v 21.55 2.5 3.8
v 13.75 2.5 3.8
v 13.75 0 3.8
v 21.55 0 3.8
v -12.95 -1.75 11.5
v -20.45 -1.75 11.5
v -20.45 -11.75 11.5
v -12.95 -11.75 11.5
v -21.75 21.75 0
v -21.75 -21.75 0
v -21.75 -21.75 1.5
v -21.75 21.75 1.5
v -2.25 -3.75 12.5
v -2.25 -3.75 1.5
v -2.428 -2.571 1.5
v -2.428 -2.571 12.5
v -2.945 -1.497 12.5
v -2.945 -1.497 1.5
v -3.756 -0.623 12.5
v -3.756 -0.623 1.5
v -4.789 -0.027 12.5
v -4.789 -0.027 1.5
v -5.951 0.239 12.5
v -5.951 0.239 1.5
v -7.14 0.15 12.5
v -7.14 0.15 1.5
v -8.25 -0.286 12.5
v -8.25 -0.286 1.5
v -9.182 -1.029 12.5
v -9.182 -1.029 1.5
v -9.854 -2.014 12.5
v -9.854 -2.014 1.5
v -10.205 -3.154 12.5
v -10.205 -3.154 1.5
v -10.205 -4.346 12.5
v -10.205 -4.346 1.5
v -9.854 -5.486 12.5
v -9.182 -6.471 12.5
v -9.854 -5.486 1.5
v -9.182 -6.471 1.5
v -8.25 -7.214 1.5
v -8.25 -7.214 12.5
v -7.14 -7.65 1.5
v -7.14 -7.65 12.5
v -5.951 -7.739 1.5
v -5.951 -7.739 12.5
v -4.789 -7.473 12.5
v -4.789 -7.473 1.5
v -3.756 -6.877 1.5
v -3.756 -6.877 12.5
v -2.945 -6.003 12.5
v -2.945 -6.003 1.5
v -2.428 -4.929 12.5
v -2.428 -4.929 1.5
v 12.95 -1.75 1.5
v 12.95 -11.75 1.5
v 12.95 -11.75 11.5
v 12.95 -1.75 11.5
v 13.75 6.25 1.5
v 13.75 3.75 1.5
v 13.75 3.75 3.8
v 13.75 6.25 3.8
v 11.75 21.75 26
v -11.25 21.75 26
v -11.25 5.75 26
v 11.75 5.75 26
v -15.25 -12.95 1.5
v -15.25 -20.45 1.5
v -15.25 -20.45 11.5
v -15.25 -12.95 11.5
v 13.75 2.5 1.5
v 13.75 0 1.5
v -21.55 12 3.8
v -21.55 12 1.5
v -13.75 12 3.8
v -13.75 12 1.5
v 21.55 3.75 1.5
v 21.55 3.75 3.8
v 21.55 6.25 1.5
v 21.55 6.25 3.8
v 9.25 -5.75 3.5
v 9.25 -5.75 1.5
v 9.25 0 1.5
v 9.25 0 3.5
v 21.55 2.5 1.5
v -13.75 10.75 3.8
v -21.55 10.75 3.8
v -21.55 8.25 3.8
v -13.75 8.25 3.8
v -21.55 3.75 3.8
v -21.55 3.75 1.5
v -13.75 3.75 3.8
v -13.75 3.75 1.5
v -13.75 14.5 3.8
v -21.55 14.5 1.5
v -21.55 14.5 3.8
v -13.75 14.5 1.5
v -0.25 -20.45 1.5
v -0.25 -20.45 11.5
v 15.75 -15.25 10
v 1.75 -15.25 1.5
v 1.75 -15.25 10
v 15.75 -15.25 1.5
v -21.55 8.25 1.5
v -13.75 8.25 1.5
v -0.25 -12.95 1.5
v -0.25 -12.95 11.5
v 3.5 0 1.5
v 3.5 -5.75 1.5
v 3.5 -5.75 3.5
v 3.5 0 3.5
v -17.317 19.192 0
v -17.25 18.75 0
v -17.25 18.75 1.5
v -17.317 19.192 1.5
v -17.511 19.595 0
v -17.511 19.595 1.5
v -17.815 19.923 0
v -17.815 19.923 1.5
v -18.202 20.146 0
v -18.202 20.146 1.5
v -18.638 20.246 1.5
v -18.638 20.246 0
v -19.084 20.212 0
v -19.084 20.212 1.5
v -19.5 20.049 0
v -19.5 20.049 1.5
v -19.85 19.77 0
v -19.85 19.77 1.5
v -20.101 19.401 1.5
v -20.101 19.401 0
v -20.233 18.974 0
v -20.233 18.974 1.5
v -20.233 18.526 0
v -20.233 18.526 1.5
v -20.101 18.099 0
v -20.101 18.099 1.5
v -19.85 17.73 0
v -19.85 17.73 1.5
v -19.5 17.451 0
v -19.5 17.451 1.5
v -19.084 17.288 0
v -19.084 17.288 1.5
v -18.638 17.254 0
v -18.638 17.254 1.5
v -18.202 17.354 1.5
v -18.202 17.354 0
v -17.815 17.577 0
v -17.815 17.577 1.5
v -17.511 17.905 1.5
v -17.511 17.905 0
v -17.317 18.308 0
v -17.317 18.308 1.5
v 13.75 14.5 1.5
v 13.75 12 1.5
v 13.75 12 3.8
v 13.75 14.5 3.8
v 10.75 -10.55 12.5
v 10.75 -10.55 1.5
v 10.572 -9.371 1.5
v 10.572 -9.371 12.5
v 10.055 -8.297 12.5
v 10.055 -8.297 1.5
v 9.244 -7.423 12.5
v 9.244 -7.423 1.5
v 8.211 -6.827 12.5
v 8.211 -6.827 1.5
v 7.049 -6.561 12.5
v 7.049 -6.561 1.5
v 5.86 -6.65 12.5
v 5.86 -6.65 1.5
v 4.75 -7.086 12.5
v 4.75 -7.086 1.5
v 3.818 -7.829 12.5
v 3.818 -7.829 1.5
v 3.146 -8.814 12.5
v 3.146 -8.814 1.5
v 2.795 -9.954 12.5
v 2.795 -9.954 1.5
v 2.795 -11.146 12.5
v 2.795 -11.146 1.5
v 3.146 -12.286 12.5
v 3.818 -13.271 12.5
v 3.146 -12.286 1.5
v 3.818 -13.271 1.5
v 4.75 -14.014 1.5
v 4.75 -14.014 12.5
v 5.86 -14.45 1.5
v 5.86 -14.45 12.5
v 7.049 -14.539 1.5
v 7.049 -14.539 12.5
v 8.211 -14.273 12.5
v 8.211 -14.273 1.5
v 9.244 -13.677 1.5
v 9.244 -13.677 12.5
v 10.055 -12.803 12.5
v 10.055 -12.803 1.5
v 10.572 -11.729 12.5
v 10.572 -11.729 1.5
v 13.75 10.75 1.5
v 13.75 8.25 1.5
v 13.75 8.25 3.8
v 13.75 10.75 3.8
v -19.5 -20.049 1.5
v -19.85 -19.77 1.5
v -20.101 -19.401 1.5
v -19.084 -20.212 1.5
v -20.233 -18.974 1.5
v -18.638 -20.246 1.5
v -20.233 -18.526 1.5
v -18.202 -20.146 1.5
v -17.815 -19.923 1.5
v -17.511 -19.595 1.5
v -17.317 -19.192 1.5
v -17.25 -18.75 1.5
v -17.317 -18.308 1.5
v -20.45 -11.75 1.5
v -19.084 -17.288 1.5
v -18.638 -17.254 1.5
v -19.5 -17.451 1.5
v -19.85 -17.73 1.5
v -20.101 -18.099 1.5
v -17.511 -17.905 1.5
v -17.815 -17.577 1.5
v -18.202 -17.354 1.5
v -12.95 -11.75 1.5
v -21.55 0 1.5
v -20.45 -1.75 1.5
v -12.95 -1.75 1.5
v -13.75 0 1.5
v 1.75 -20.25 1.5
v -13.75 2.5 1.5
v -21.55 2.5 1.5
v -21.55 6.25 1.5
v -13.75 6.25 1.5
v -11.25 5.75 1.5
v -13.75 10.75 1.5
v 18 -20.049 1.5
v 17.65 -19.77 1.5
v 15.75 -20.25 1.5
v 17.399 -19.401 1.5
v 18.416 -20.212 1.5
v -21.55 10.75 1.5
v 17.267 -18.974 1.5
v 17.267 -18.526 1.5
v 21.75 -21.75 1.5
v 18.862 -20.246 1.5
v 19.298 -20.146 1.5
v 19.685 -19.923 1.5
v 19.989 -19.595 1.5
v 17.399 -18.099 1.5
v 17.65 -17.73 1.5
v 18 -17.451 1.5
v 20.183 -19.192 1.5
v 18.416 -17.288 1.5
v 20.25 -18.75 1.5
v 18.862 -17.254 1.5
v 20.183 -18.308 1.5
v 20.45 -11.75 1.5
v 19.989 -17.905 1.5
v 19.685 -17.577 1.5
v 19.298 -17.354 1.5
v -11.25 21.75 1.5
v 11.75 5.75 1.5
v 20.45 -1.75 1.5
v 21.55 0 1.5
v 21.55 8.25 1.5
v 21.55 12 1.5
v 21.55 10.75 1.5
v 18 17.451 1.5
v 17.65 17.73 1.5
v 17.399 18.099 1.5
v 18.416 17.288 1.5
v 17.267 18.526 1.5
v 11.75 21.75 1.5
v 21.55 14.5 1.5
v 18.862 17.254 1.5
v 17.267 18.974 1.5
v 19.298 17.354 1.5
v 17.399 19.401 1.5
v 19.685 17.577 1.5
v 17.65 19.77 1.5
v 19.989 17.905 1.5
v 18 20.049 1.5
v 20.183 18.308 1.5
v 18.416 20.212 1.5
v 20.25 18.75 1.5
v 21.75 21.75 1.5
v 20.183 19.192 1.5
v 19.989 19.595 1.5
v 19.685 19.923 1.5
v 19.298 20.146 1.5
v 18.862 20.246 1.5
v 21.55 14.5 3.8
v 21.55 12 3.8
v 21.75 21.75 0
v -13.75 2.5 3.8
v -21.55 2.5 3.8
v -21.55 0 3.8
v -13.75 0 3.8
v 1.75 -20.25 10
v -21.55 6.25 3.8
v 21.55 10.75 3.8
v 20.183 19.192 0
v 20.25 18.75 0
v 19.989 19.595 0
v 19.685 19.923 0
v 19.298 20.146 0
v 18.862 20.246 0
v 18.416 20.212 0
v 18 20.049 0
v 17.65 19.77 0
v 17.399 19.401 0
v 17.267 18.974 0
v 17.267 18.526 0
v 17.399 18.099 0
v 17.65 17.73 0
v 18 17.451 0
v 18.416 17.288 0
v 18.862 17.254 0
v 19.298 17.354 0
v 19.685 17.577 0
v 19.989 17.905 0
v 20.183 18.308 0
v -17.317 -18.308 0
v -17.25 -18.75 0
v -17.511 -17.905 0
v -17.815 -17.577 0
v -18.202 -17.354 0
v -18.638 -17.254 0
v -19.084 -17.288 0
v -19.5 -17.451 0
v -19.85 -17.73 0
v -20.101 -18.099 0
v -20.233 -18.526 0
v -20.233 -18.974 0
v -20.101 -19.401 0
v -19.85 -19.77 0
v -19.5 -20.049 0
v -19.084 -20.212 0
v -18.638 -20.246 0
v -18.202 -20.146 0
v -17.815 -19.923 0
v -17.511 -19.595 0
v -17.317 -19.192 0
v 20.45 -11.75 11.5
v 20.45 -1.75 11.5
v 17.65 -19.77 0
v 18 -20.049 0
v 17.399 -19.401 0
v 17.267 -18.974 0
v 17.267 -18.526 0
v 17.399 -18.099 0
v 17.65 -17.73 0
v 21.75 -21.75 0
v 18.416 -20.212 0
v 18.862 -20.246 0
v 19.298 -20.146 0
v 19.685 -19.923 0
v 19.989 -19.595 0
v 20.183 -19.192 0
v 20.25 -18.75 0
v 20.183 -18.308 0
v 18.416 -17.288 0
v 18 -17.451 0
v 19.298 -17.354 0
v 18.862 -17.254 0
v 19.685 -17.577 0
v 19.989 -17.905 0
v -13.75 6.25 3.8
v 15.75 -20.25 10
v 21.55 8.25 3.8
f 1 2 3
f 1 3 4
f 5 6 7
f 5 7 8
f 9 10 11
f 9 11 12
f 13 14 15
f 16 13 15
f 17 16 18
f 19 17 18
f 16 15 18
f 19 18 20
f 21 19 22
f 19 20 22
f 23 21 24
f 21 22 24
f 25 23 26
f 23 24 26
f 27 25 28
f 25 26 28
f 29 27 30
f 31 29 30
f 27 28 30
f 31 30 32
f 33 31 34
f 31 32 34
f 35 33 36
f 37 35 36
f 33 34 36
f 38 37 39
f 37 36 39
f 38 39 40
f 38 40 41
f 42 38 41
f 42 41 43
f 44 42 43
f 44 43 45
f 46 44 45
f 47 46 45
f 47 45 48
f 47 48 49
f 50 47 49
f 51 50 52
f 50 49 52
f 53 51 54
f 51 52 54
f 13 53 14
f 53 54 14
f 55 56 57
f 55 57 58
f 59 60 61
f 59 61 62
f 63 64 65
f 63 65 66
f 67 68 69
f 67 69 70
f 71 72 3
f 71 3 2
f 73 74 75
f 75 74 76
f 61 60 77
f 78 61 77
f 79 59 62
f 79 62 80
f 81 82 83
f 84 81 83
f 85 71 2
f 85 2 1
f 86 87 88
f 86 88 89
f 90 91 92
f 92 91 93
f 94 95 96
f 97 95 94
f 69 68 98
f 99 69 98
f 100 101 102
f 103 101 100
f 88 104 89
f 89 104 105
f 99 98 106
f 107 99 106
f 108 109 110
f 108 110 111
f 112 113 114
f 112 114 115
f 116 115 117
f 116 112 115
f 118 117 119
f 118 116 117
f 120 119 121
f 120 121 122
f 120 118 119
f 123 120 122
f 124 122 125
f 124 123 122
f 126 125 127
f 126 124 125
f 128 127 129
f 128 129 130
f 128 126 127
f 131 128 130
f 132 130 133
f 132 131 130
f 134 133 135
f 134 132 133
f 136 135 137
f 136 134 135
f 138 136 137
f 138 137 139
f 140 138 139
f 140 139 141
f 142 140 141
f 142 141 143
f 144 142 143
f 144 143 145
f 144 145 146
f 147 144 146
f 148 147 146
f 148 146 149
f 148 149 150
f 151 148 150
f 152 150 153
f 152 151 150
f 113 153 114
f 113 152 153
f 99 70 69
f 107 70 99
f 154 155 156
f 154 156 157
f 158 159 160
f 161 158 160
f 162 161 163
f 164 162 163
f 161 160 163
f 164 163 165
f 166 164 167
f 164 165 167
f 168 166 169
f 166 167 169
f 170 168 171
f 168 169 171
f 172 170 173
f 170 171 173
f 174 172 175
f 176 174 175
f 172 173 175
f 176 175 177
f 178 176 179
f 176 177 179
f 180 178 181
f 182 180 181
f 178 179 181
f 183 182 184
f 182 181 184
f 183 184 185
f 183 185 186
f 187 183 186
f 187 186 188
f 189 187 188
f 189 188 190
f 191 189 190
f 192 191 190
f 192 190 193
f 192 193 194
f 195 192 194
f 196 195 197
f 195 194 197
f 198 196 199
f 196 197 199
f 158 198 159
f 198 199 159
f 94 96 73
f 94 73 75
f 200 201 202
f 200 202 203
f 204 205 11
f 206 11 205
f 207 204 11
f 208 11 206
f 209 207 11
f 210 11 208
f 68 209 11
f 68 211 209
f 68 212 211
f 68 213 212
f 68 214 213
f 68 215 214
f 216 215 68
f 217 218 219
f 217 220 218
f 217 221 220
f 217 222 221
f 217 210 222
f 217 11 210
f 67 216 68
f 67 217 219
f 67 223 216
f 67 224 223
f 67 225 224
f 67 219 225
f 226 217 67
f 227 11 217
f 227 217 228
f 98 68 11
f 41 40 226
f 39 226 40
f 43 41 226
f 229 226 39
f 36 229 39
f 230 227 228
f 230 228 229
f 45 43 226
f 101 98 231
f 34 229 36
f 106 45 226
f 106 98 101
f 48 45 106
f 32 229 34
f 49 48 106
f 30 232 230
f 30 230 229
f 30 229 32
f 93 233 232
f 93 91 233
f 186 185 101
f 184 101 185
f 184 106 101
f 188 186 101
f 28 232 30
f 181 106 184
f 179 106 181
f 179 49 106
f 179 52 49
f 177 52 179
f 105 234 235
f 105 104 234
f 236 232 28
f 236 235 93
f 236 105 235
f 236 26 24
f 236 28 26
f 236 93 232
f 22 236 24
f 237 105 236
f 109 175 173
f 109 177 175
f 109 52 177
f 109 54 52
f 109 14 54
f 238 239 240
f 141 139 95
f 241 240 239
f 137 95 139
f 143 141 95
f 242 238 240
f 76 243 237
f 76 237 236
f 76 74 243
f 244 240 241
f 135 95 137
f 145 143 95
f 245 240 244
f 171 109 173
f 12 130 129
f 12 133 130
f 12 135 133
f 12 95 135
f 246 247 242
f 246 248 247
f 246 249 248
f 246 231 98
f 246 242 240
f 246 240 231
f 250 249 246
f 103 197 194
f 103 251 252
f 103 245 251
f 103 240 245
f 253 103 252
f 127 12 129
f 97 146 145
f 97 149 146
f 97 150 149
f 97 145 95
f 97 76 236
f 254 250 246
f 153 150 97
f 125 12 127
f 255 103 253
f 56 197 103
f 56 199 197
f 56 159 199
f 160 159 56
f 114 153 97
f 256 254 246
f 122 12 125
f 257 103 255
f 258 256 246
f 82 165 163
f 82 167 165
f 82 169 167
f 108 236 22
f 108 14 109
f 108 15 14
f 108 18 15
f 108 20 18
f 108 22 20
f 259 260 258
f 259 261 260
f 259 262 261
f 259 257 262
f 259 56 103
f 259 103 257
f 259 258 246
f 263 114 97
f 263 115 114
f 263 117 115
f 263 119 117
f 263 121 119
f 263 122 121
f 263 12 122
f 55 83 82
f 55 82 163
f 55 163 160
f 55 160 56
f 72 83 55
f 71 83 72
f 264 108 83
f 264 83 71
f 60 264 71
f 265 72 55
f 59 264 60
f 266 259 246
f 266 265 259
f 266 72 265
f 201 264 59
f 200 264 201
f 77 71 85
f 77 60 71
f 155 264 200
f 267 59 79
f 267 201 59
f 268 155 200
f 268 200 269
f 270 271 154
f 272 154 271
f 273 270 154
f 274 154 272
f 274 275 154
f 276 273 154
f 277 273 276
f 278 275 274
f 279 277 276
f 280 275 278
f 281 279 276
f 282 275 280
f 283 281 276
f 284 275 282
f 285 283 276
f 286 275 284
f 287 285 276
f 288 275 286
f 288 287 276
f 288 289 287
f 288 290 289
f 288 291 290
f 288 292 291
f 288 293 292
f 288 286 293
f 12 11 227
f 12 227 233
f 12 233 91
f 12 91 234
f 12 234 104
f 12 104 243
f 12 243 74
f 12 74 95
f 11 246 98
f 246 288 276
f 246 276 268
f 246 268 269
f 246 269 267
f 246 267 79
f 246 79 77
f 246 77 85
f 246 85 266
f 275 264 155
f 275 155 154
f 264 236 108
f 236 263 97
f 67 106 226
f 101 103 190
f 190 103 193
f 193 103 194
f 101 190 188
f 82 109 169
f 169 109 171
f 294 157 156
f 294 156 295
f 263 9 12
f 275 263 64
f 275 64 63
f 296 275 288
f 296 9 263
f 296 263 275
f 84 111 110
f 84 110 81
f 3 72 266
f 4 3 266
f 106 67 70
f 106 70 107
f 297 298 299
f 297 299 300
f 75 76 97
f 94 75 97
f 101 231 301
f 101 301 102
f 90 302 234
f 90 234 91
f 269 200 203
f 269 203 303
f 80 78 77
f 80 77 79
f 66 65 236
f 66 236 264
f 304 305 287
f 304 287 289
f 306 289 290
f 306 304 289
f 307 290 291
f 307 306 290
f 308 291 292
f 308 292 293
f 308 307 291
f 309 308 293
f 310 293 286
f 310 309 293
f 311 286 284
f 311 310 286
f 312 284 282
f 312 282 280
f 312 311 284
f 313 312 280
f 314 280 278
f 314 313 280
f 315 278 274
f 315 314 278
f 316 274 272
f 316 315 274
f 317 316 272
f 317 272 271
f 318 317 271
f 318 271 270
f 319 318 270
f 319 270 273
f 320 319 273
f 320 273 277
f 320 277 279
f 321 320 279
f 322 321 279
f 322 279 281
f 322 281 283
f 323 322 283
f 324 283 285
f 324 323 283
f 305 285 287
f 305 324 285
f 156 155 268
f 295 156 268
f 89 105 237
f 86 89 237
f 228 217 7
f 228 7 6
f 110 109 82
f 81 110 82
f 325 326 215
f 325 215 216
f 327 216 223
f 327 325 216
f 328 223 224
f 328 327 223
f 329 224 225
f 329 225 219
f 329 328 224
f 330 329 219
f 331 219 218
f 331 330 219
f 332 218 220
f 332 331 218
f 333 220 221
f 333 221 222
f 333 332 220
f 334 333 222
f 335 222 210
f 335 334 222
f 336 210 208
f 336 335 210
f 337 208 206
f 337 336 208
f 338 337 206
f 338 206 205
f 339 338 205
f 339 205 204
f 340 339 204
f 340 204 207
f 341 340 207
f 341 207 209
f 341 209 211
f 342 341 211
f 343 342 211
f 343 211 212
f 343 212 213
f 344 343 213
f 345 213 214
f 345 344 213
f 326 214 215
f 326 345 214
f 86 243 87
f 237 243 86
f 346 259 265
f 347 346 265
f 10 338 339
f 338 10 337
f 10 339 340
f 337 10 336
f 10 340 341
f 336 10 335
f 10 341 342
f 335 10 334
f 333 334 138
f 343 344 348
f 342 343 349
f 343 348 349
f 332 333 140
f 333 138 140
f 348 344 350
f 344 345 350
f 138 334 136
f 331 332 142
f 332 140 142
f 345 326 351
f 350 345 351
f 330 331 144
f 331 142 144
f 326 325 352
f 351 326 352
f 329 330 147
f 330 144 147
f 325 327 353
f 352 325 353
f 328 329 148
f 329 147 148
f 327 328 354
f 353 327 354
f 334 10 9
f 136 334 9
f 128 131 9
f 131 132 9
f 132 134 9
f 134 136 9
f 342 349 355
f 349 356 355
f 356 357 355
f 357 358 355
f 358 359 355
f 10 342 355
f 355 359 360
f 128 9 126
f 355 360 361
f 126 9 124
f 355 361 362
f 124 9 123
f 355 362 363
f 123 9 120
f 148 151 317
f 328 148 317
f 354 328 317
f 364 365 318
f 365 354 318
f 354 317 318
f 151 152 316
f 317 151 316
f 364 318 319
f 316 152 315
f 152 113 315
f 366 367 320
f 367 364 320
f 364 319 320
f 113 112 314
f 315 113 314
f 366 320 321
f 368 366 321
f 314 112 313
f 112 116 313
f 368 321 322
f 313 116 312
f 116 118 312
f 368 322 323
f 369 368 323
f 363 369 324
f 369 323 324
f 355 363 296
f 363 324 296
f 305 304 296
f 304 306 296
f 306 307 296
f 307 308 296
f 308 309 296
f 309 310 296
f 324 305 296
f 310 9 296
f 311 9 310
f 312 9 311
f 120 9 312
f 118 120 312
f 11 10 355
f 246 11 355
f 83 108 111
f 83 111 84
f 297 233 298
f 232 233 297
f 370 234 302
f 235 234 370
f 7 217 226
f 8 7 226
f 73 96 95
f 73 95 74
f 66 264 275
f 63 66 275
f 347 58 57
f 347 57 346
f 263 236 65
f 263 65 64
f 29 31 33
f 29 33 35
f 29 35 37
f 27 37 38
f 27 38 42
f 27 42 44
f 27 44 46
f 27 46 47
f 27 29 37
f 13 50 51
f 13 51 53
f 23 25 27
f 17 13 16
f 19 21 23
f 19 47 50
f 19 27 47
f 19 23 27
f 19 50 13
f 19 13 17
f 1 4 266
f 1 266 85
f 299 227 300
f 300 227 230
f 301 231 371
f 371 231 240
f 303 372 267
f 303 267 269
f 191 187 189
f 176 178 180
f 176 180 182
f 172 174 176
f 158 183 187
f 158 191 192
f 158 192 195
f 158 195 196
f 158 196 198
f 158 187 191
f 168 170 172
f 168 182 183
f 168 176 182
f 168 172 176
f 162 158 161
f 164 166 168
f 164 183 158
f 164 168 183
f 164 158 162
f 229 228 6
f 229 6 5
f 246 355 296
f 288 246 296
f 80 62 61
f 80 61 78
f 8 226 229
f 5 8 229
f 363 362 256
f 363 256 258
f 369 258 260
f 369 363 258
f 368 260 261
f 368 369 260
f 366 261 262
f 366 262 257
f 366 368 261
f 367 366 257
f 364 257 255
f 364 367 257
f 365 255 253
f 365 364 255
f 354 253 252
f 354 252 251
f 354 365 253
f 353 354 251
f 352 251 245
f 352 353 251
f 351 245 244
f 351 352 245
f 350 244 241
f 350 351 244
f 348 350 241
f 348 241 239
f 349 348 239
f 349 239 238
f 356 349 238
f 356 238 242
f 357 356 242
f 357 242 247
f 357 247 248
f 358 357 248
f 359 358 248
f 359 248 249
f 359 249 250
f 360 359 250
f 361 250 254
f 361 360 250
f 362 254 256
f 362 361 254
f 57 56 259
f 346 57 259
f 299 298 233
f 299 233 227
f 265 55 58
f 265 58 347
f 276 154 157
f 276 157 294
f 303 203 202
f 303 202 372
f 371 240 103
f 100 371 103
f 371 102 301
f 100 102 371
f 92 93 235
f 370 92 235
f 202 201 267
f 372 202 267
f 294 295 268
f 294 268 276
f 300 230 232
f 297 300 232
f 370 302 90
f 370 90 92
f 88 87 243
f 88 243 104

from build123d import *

# Parameters (mm, degrees)
F0_W      = 43.5
F0_H      = 43.5
F0_R      = 1.5
F1_DEPTH  = 1.5
F2_W      = 23
F2_H      = 16
F3_DEPTH  = 24.5
F4_W      = 8
F4_H      = 2.5
F5_DEPTH  = 2.3
F6_W      = 5.75
F6_H      = 5.75
F7_DEPTH  = 2
F8_R      = 4
F9_DEPTH  = 11
F10_W     = 7.5
F10_H     = 10
F10_W_2   = 15
F10_H_2   = 7.5
F11_DEPTH = 10
F12_W     = 14
F12_H     = 5
F13_DEPTH = 8.5
F14_W     = 2.5
F14_H     = 2.3
F15_DEPTH = 0.2
F16_W     = 2.5
F16_H     = 2.3
F17_DEPTH = 0.2


with BuildPart() as f1:
    # F0 (on Top) → F1 (new body)
    with BuildSketch(Plane.XY):
        Rectangle(F0_W, F0_H)
        with Locations((-18.75, -18.75)):
            Circle(F0_R, mode=Mode.SUBTRACT)
        with Locations((18.75, -18.75)):
            Circle(F0_R, mode=Mode.SUBTRACT)
        with Locations((-18.75, 18.75)):
            Circle(F0_R, mode=Mode.SUBTRACT)
        with Locations((18.75, 18.75)):
            Circle(F0_R, mode=Mode.SUBTRACT)
    extrude(amount=F1_DEPTH)

    # F2 (on face) → F3 (join)
    with BuildSketch(Plane.XY.offset(1.5)):
        with Locations((0.25, 13.75)):
            Rectangle(F2_W, F2_H)
    extrude(amount=F3_DEPTH)

    # F4 (on face) → F5 (join)
    with BuildSketch(Plane.XY.offset(1.5)):
        with Locations((-17.75, 13.25)):
            Rectangle(F4_W, F4_H)
        with Locations((-17.75, 9.5)):
            Rectangle(F4_W, F4_H)
        with Locations((-17.75, 5)):
            Rectangle(F4_W, F4_H)
        with Locations((17.75, 13.25)):
            Rectangle(F4_W, F4_H)
        with Locations((17.75, 9.5)):
            Rectangle(F4_W, F4_H)
        with Locations((17.75, 5)):
            Rectangle(F4_W, F4_H)
        with Locations((17.75, 1.25)):
            Rectangle(F4_W, F4_H)
        with Locations((-17.75, 1.25)):
            Rectangle(F4_W, F4_H)
    extrude(amount=F5_DEPTH)

    # F6 (on face) → F7 (join)
    with BuildSketch(Plane.XY.offset(1.5)):
        with Locations((6.375, -2.875)):
            Rectangle(F6_W, F6_H)
    extrude(amount=F7_DEPTH)

    # F8 (on face) → F9 (join)
    with BuildSketch(Plane.XY.offset(1.5)):
        with Locations((-6.25, -3.75)):
            Circle(F8_R)
        with Locations((6.75, -10.55)):
            Circle(F8_R)
    extrude(amount=F9_DEPTH)

    # F10 (on face) → F11 (join)
    with BuildSketch(Plane.XY.offset(1.5)):
        with Locations((16.7, -6.75)):
            Rectangle(F10_W, F10_H)
        with Locations((-16.7, -6.75)):
            Rectangle(F10_W, F10_H)
        with Locations((-7.75, -16.7)):
            Rectangle(F10_W_2, F10_H_2)
    extrude(amount=F11_DEPTH)

    # F12 (on face) → F13 (join)
    with BuildSketch(Plane.XY.offset(1.5)):
        with Locations((8.75, -17.75)):
            Rectangle(F12_W, F12_H)
    extrude(amount=F13_DEPTH)

    # F14 (on face) → F15 (cut)
    with BuildSketch(Plane.YZ.offset(21.75)):
        with Locations((1.25, 2.65)):
            Rectangle(F14_W, F14_H)
        with Locations((5, 2.65)):
            Rectangle(F14_W, F14_H)
        with Locations((9.5, 2.65)):
            Rectangle(F14_W, F14_H)
        with Locations((13.25, 2.65)):
            Rectangle(F14_W, F14_H)
    extrude(amount=-F15_DEPTH, mode=Mode.SUBTRACT)

    # F16 (on face) → F17 (cut)
    with BuildSketch(Plane(origin=(-21.75, 0, 0), x_dir=(0, -1, 0), z_dir=(-1, 0, 0))):
        with Locations((-13.25, 2.65)):
            Rectangle(F16_W, F16_H)
        with Locations((-9.5, 2.65)):
            Rectangle(F16_W, F16_H)
        with Locations((-5, 2.65)):
            Rectangle(F16_W, F16_H)
        with Locations((-1.25, 2.65)):
            Rectangle(F16_W, F16_H)
    extrude(amount=-F17_DEPTH, mode=Mode.SUBTRACT)


solid = f1.part
